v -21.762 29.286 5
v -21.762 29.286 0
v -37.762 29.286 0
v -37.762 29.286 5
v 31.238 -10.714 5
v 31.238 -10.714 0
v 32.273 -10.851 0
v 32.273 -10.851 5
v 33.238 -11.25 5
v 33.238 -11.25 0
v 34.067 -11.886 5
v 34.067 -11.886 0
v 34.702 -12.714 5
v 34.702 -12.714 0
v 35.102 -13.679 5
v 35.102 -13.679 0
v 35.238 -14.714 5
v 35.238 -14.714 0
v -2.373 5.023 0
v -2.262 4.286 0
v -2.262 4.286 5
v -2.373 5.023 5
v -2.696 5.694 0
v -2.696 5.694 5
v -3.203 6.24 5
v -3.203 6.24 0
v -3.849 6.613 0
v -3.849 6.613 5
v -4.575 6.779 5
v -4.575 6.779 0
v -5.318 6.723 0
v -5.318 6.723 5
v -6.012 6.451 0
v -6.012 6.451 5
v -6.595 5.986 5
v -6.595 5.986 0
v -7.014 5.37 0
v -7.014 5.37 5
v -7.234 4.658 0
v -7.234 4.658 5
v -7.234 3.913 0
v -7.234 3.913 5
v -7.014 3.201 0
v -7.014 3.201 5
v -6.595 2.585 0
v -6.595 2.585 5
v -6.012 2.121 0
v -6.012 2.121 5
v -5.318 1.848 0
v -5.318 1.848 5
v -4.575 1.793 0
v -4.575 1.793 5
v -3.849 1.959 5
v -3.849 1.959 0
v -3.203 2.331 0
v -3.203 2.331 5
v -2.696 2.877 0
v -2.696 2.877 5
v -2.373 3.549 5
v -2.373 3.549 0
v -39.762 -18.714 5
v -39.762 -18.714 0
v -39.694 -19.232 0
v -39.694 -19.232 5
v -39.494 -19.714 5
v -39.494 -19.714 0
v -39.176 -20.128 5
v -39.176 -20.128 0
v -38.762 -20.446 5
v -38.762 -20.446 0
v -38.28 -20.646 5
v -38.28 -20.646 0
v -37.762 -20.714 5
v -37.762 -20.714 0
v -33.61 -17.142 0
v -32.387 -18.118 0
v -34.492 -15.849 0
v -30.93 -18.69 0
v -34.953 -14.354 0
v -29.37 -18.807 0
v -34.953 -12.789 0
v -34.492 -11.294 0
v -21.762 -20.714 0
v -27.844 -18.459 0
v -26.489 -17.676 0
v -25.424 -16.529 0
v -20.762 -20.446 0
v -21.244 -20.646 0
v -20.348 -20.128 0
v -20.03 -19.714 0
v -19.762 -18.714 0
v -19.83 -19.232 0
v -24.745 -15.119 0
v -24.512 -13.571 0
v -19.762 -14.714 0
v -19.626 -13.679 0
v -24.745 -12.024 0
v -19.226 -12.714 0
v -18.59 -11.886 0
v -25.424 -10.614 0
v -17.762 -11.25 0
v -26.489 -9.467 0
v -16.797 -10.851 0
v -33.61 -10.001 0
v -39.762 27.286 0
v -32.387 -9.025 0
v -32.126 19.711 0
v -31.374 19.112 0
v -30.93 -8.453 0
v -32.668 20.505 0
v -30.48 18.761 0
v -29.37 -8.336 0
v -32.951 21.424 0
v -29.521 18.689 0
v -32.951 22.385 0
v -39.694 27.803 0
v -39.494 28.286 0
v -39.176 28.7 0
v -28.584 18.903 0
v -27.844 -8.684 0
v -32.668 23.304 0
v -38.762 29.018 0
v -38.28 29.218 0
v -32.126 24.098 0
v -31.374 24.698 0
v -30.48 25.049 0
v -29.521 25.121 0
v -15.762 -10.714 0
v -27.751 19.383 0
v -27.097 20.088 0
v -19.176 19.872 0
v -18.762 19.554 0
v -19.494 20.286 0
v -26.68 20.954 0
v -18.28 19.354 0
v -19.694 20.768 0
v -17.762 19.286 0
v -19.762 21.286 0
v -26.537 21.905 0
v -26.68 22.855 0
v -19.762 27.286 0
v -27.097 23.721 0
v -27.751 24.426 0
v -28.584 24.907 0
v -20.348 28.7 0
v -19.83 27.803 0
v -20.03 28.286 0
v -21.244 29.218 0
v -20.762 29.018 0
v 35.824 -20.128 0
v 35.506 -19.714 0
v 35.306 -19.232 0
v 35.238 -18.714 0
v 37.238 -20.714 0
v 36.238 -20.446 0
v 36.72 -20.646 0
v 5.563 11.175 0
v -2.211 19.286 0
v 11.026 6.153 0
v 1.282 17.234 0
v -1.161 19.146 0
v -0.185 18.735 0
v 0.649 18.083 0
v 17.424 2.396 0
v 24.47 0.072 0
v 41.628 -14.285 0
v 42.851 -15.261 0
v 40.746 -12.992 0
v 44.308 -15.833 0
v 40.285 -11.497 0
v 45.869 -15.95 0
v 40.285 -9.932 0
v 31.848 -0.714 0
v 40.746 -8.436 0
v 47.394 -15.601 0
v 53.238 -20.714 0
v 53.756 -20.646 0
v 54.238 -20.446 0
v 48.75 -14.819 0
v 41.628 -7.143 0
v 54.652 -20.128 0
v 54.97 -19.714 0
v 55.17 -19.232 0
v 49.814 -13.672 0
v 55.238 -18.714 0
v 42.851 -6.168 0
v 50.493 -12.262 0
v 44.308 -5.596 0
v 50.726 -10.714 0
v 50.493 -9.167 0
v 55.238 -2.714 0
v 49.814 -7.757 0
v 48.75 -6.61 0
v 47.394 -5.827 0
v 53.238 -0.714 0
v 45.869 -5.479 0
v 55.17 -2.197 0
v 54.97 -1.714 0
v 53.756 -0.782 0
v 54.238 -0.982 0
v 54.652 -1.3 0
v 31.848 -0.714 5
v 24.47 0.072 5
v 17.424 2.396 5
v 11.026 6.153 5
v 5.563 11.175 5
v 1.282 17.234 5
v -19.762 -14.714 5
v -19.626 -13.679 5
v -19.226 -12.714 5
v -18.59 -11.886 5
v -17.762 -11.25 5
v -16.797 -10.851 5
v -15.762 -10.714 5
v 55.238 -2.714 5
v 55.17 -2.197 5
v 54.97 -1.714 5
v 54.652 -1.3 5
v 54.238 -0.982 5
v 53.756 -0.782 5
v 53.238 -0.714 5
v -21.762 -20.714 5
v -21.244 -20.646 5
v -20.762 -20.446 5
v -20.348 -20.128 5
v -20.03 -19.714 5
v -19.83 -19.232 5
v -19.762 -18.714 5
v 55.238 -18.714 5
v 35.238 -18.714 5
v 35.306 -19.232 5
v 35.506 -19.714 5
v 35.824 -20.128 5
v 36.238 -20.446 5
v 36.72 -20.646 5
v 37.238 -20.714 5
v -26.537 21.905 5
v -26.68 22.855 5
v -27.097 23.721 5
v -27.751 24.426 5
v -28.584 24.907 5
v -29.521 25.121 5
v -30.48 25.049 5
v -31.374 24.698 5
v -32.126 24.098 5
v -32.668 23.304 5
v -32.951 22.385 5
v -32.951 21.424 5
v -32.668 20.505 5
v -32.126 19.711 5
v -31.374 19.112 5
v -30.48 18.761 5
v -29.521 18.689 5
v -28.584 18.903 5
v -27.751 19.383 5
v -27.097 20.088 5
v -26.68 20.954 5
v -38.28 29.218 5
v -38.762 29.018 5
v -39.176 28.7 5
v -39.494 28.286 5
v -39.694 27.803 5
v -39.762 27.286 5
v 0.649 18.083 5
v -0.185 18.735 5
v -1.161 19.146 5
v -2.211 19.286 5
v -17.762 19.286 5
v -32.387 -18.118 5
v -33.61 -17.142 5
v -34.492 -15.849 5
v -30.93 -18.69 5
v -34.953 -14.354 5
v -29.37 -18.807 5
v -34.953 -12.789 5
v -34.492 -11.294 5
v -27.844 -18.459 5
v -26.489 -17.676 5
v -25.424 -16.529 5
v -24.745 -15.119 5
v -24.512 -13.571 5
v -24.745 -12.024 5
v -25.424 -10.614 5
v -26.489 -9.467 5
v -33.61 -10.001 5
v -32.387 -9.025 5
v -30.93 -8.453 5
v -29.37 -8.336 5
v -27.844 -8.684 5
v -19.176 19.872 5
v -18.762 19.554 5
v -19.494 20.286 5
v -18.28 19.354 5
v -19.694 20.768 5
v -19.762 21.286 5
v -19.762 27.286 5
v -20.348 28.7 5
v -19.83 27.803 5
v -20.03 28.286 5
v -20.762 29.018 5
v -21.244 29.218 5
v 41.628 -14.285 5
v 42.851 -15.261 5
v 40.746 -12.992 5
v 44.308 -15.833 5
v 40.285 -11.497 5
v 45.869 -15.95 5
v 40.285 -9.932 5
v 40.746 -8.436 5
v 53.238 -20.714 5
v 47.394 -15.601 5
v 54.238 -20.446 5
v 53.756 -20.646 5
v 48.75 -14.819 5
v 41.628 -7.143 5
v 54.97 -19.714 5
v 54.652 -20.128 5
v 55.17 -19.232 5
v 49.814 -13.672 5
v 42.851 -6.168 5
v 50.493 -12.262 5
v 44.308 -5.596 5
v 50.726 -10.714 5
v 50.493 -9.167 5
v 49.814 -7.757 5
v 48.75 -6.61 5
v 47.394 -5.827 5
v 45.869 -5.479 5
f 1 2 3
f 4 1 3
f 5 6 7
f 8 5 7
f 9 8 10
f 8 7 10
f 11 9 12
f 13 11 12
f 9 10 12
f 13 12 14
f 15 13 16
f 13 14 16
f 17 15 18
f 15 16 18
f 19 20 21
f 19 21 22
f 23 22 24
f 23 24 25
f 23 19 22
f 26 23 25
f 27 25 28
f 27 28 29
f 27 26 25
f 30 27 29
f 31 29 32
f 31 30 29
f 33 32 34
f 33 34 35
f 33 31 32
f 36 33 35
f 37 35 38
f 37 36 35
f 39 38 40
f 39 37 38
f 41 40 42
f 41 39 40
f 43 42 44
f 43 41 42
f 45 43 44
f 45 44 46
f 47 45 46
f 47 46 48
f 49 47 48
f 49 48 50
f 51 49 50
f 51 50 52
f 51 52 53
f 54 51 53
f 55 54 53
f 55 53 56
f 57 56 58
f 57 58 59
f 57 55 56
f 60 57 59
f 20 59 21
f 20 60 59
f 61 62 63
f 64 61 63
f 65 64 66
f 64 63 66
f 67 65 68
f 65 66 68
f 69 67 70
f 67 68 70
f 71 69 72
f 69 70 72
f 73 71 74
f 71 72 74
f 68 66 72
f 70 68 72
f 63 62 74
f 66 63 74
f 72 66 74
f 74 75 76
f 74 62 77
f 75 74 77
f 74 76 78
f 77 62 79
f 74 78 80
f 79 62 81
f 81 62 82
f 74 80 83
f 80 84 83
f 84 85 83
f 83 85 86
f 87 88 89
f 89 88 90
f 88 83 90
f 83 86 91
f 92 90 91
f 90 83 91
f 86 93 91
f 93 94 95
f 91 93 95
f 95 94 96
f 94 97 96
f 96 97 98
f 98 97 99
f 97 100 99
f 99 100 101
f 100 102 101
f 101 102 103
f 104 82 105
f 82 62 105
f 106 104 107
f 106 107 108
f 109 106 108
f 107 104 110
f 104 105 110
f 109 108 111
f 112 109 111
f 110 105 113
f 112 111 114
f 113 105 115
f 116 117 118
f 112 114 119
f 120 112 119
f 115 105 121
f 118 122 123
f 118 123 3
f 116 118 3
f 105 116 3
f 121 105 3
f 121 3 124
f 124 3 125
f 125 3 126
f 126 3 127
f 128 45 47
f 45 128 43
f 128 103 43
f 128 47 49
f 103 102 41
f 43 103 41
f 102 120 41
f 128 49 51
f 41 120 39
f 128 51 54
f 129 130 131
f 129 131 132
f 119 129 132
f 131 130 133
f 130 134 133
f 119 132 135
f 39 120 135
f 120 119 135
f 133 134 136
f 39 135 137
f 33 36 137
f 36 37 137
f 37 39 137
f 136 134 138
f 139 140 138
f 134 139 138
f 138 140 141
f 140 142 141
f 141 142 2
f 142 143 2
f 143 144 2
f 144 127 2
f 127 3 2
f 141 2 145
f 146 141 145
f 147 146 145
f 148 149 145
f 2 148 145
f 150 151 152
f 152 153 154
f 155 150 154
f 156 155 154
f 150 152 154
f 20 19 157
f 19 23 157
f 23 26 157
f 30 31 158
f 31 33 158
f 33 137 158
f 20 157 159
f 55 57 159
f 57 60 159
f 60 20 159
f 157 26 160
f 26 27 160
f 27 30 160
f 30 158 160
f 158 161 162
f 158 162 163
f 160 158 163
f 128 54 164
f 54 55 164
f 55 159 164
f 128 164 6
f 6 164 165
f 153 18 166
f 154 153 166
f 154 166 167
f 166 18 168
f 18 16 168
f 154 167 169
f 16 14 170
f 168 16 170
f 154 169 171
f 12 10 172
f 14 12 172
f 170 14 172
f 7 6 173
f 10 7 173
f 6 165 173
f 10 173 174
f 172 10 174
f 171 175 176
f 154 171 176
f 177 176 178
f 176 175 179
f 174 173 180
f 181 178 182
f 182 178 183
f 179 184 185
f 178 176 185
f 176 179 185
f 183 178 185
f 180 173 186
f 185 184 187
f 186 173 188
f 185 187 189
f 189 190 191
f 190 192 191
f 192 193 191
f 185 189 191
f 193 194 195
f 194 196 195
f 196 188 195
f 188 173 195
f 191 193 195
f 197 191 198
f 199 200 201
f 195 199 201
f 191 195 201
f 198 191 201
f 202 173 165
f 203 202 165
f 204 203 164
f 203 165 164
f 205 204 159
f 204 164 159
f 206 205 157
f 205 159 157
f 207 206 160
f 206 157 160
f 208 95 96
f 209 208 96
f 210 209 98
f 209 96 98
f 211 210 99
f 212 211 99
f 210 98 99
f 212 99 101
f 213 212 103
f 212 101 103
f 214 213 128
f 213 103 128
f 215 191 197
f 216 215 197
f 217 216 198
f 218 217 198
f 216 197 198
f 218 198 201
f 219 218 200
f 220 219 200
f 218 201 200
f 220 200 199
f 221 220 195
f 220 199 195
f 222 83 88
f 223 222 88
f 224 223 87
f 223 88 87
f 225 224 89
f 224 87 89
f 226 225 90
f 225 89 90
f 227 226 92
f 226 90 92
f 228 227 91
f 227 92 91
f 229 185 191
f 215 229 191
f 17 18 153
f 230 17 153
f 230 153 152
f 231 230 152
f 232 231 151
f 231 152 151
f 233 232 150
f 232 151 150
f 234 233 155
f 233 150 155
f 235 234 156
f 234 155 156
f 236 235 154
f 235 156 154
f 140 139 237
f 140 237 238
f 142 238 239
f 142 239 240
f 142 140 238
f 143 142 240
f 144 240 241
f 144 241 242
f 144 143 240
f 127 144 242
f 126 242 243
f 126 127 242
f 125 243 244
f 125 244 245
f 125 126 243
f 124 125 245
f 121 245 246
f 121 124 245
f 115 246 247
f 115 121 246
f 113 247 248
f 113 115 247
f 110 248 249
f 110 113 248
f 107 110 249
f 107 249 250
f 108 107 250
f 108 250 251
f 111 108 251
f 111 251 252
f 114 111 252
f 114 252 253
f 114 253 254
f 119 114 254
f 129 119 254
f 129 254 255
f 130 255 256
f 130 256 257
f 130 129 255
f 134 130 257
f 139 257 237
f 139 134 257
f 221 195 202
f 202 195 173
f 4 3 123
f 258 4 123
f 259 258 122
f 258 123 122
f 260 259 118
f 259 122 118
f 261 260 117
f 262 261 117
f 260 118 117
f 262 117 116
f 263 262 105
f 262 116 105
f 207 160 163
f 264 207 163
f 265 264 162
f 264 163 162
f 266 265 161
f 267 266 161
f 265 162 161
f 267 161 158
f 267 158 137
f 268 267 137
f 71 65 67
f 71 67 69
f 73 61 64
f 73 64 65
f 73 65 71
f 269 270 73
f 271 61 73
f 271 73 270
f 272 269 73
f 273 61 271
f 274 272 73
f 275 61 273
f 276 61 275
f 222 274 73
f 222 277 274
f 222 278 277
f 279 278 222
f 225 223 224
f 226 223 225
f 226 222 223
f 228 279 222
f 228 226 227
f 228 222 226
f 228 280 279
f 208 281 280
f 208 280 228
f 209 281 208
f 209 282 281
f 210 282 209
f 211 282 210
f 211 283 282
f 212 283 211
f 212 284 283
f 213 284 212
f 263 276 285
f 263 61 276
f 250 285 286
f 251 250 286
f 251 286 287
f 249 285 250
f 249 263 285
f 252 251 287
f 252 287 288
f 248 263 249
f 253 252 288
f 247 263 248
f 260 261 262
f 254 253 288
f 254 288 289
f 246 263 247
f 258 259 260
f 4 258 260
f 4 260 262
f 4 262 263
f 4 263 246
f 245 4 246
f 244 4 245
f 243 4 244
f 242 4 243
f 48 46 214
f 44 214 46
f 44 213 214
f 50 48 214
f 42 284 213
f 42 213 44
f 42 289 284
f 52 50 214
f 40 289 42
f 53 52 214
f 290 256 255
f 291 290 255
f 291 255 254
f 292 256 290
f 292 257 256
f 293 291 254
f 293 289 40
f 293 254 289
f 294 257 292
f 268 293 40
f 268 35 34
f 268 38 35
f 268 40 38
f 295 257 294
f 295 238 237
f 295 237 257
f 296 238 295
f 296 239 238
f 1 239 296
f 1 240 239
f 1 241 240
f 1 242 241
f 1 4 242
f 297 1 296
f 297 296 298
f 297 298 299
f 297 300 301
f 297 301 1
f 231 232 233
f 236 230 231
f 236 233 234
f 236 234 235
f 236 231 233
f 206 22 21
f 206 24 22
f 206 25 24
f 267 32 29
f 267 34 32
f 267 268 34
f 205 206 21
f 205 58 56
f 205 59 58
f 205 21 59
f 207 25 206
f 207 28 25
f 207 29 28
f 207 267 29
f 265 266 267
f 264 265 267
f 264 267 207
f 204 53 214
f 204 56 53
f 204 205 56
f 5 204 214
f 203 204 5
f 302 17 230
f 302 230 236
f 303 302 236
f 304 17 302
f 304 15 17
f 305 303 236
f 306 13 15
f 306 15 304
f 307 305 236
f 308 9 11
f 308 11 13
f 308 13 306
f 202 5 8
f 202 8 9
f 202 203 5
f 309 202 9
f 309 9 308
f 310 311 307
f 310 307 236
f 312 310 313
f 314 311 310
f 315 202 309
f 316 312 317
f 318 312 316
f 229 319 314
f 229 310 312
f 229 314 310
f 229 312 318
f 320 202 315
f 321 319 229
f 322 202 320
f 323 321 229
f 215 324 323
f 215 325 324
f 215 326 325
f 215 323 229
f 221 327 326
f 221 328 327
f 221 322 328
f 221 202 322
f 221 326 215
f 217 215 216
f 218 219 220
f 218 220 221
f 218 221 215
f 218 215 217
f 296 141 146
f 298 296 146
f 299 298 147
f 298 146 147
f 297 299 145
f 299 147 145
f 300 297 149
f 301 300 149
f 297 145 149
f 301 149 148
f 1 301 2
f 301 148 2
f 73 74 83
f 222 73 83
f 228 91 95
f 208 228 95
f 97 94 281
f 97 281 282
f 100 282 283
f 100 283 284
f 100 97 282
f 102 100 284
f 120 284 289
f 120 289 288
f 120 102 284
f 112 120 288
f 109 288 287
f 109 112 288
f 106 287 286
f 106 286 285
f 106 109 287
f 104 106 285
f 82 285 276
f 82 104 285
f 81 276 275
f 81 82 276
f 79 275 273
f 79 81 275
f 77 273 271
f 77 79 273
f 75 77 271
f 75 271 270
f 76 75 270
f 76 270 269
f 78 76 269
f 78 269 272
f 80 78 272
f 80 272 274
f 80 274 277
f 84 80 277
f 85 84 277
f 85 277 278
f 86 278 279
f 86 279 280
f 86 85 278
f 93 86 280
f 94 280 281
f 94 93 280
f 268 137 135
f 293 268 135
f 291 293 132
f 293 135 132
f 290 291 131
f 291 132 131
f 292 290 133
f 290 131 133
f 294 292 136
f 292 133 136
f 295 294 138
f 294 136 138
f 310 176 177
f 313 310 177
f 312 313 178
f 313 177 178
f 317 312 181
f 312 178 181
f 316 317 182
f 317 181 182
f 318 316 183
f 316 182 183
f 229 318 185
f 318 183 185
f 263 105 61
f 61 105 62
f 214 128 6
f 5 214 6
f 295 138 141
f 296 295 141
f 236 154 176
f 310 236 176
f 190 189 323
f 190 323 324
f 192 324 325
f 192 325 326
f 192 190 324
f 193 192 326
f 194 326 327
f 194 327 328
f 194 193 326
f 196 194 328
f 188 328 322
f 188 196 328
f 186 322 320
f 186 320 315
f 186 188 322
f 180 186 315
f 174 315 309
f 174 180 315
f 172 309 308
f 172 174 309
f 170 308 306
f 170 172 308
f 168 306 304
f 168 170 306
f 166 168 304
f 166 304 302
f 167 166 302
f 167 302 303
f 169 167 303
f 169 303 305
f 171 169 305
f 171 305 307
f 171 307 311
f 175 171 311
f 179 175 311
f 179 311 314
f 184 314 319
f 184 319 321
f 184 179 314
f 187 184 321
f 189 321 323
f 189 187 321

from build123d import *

# Parameters (mm, degrees)
ESBO_O1_R                = 5.25
ESBO_O1_R_2              = 3.225
ESBO_O1_R_3              = 2.5
RESSALTO_EXTRUS_O1_DEPTH = 5


with BuildPart() as part:
    # Esboço1 → Ressalto-extrusão1 (new body)
    with BuildSketch(Plane.XY):
        with BuildLine():
            Line((0.238095238, -10.714285714), (31.238095238, -10.714285714))
            ThreePointArc((31.238095238, -10.714285714), (34.066522363, -11.88585859), (35.238095238, -14.714285714))
            Line((35.238095238, -14.714285714), (35.238095238, -18.714285714))
            ThreePointArc((35.238095238, -18.714285714), (35.823881676, -20.128499277), (37.238095238, -20.714285714))
            Line((37.238095238, -20.714285714), (53.238095238, -20.714285714))
            ThreePointArc((53.238095238, -20.714285714), (54.6523088, -20.128499277), (55.238095238, -18.714285714))
            Line((55.238095238, -18.714285714), (55.238095238, -2.714285714))
            ThreePointArc((55.238095238, -2.714285714), (54.6523088, -1.300072152), (53.238095238, -0.714285714))
            Line((53.238095238, -0.714285714), (31.847818571, -0.714285714))
            ThreePointArc((31.847818571, -0.714285714), (14.124879647, 4.104636838), (1.282253299, 17.234432234))
            ThreePointArc((1.282253299, 17.234432234), (-0.185475427, 18.73498028), (-2.210954161, 19.285714286))
            Line((-2.210954161, 19.285714286), (-17.761904762, 19.285714286))
            ThreePointArc((-17.761904762, 19.285714286), (-19.176118324, 19.871500723), (-19.761904762, 21.285714286))
            Line((-19.761904762, 21.285714286), (-19.761904762, 27.285714286))
            ThreePointArc((-19.761904762, 27.285714286), (-20.3476912, 28.699927848), (-21.761904762, 29.285714286))
            Line((-21.761904762, 29.285714286), (-37.761904762, 29.285714286))
            ThreePointArc((-37.761904762, 29.285714286), (-39.176118324, 28.699927848), (-39.761904762, 27.285714286))
            Line((-39.761904762, 27.285714286), (-39.761904762, -18.714285714))
            ThreePointArc((-39.761904762, -18.714285714), (-39.176118324, -20.128499277), (-37.761904762, -20.714285714))
            Line((-37.761904762, -20.714285714), (-21.761904762, -20.714285714))
            ThreePointArc((-21.761904762, -20.714285714), (-20.3476912, -20.128499277), (-19.761904762, -18.714285714))
            Line((-19.761904762, -18.714285714), (-19.761904762, -14.714285714))
            ThreePointArc((-19.761904762, -14.714285714), (-18.590331887, -11.88585859), (-15.761904762, -10.714285714))
            Line((-15.761904762, -10.714285714), (0.238095238, -10.714285714))
        make_face()
        with Locations((-29.761904762, -13.571428571)):
            Circle(ESBO_O1_R, mode=Mode.SUBTRACT)
        with Locations((-29.761904762, 21.904761905)):
            Circle(ESBO_O1_R_2, mode=Mode.SUBTRACT)
        with Locations((-4.761904762, 4.285714286)):
            Circle(ESBO_O1_R_3, mode=Mode.SUBTRACT)
        with Locations((45.476190476, -10.714285714)):
            Circle(ESBO_O1_R, mode=Mode.SUBTRACT)
    extrude(amount=RESSALTO_EXTRUS_O1_DEPTH)


solid = part.part
